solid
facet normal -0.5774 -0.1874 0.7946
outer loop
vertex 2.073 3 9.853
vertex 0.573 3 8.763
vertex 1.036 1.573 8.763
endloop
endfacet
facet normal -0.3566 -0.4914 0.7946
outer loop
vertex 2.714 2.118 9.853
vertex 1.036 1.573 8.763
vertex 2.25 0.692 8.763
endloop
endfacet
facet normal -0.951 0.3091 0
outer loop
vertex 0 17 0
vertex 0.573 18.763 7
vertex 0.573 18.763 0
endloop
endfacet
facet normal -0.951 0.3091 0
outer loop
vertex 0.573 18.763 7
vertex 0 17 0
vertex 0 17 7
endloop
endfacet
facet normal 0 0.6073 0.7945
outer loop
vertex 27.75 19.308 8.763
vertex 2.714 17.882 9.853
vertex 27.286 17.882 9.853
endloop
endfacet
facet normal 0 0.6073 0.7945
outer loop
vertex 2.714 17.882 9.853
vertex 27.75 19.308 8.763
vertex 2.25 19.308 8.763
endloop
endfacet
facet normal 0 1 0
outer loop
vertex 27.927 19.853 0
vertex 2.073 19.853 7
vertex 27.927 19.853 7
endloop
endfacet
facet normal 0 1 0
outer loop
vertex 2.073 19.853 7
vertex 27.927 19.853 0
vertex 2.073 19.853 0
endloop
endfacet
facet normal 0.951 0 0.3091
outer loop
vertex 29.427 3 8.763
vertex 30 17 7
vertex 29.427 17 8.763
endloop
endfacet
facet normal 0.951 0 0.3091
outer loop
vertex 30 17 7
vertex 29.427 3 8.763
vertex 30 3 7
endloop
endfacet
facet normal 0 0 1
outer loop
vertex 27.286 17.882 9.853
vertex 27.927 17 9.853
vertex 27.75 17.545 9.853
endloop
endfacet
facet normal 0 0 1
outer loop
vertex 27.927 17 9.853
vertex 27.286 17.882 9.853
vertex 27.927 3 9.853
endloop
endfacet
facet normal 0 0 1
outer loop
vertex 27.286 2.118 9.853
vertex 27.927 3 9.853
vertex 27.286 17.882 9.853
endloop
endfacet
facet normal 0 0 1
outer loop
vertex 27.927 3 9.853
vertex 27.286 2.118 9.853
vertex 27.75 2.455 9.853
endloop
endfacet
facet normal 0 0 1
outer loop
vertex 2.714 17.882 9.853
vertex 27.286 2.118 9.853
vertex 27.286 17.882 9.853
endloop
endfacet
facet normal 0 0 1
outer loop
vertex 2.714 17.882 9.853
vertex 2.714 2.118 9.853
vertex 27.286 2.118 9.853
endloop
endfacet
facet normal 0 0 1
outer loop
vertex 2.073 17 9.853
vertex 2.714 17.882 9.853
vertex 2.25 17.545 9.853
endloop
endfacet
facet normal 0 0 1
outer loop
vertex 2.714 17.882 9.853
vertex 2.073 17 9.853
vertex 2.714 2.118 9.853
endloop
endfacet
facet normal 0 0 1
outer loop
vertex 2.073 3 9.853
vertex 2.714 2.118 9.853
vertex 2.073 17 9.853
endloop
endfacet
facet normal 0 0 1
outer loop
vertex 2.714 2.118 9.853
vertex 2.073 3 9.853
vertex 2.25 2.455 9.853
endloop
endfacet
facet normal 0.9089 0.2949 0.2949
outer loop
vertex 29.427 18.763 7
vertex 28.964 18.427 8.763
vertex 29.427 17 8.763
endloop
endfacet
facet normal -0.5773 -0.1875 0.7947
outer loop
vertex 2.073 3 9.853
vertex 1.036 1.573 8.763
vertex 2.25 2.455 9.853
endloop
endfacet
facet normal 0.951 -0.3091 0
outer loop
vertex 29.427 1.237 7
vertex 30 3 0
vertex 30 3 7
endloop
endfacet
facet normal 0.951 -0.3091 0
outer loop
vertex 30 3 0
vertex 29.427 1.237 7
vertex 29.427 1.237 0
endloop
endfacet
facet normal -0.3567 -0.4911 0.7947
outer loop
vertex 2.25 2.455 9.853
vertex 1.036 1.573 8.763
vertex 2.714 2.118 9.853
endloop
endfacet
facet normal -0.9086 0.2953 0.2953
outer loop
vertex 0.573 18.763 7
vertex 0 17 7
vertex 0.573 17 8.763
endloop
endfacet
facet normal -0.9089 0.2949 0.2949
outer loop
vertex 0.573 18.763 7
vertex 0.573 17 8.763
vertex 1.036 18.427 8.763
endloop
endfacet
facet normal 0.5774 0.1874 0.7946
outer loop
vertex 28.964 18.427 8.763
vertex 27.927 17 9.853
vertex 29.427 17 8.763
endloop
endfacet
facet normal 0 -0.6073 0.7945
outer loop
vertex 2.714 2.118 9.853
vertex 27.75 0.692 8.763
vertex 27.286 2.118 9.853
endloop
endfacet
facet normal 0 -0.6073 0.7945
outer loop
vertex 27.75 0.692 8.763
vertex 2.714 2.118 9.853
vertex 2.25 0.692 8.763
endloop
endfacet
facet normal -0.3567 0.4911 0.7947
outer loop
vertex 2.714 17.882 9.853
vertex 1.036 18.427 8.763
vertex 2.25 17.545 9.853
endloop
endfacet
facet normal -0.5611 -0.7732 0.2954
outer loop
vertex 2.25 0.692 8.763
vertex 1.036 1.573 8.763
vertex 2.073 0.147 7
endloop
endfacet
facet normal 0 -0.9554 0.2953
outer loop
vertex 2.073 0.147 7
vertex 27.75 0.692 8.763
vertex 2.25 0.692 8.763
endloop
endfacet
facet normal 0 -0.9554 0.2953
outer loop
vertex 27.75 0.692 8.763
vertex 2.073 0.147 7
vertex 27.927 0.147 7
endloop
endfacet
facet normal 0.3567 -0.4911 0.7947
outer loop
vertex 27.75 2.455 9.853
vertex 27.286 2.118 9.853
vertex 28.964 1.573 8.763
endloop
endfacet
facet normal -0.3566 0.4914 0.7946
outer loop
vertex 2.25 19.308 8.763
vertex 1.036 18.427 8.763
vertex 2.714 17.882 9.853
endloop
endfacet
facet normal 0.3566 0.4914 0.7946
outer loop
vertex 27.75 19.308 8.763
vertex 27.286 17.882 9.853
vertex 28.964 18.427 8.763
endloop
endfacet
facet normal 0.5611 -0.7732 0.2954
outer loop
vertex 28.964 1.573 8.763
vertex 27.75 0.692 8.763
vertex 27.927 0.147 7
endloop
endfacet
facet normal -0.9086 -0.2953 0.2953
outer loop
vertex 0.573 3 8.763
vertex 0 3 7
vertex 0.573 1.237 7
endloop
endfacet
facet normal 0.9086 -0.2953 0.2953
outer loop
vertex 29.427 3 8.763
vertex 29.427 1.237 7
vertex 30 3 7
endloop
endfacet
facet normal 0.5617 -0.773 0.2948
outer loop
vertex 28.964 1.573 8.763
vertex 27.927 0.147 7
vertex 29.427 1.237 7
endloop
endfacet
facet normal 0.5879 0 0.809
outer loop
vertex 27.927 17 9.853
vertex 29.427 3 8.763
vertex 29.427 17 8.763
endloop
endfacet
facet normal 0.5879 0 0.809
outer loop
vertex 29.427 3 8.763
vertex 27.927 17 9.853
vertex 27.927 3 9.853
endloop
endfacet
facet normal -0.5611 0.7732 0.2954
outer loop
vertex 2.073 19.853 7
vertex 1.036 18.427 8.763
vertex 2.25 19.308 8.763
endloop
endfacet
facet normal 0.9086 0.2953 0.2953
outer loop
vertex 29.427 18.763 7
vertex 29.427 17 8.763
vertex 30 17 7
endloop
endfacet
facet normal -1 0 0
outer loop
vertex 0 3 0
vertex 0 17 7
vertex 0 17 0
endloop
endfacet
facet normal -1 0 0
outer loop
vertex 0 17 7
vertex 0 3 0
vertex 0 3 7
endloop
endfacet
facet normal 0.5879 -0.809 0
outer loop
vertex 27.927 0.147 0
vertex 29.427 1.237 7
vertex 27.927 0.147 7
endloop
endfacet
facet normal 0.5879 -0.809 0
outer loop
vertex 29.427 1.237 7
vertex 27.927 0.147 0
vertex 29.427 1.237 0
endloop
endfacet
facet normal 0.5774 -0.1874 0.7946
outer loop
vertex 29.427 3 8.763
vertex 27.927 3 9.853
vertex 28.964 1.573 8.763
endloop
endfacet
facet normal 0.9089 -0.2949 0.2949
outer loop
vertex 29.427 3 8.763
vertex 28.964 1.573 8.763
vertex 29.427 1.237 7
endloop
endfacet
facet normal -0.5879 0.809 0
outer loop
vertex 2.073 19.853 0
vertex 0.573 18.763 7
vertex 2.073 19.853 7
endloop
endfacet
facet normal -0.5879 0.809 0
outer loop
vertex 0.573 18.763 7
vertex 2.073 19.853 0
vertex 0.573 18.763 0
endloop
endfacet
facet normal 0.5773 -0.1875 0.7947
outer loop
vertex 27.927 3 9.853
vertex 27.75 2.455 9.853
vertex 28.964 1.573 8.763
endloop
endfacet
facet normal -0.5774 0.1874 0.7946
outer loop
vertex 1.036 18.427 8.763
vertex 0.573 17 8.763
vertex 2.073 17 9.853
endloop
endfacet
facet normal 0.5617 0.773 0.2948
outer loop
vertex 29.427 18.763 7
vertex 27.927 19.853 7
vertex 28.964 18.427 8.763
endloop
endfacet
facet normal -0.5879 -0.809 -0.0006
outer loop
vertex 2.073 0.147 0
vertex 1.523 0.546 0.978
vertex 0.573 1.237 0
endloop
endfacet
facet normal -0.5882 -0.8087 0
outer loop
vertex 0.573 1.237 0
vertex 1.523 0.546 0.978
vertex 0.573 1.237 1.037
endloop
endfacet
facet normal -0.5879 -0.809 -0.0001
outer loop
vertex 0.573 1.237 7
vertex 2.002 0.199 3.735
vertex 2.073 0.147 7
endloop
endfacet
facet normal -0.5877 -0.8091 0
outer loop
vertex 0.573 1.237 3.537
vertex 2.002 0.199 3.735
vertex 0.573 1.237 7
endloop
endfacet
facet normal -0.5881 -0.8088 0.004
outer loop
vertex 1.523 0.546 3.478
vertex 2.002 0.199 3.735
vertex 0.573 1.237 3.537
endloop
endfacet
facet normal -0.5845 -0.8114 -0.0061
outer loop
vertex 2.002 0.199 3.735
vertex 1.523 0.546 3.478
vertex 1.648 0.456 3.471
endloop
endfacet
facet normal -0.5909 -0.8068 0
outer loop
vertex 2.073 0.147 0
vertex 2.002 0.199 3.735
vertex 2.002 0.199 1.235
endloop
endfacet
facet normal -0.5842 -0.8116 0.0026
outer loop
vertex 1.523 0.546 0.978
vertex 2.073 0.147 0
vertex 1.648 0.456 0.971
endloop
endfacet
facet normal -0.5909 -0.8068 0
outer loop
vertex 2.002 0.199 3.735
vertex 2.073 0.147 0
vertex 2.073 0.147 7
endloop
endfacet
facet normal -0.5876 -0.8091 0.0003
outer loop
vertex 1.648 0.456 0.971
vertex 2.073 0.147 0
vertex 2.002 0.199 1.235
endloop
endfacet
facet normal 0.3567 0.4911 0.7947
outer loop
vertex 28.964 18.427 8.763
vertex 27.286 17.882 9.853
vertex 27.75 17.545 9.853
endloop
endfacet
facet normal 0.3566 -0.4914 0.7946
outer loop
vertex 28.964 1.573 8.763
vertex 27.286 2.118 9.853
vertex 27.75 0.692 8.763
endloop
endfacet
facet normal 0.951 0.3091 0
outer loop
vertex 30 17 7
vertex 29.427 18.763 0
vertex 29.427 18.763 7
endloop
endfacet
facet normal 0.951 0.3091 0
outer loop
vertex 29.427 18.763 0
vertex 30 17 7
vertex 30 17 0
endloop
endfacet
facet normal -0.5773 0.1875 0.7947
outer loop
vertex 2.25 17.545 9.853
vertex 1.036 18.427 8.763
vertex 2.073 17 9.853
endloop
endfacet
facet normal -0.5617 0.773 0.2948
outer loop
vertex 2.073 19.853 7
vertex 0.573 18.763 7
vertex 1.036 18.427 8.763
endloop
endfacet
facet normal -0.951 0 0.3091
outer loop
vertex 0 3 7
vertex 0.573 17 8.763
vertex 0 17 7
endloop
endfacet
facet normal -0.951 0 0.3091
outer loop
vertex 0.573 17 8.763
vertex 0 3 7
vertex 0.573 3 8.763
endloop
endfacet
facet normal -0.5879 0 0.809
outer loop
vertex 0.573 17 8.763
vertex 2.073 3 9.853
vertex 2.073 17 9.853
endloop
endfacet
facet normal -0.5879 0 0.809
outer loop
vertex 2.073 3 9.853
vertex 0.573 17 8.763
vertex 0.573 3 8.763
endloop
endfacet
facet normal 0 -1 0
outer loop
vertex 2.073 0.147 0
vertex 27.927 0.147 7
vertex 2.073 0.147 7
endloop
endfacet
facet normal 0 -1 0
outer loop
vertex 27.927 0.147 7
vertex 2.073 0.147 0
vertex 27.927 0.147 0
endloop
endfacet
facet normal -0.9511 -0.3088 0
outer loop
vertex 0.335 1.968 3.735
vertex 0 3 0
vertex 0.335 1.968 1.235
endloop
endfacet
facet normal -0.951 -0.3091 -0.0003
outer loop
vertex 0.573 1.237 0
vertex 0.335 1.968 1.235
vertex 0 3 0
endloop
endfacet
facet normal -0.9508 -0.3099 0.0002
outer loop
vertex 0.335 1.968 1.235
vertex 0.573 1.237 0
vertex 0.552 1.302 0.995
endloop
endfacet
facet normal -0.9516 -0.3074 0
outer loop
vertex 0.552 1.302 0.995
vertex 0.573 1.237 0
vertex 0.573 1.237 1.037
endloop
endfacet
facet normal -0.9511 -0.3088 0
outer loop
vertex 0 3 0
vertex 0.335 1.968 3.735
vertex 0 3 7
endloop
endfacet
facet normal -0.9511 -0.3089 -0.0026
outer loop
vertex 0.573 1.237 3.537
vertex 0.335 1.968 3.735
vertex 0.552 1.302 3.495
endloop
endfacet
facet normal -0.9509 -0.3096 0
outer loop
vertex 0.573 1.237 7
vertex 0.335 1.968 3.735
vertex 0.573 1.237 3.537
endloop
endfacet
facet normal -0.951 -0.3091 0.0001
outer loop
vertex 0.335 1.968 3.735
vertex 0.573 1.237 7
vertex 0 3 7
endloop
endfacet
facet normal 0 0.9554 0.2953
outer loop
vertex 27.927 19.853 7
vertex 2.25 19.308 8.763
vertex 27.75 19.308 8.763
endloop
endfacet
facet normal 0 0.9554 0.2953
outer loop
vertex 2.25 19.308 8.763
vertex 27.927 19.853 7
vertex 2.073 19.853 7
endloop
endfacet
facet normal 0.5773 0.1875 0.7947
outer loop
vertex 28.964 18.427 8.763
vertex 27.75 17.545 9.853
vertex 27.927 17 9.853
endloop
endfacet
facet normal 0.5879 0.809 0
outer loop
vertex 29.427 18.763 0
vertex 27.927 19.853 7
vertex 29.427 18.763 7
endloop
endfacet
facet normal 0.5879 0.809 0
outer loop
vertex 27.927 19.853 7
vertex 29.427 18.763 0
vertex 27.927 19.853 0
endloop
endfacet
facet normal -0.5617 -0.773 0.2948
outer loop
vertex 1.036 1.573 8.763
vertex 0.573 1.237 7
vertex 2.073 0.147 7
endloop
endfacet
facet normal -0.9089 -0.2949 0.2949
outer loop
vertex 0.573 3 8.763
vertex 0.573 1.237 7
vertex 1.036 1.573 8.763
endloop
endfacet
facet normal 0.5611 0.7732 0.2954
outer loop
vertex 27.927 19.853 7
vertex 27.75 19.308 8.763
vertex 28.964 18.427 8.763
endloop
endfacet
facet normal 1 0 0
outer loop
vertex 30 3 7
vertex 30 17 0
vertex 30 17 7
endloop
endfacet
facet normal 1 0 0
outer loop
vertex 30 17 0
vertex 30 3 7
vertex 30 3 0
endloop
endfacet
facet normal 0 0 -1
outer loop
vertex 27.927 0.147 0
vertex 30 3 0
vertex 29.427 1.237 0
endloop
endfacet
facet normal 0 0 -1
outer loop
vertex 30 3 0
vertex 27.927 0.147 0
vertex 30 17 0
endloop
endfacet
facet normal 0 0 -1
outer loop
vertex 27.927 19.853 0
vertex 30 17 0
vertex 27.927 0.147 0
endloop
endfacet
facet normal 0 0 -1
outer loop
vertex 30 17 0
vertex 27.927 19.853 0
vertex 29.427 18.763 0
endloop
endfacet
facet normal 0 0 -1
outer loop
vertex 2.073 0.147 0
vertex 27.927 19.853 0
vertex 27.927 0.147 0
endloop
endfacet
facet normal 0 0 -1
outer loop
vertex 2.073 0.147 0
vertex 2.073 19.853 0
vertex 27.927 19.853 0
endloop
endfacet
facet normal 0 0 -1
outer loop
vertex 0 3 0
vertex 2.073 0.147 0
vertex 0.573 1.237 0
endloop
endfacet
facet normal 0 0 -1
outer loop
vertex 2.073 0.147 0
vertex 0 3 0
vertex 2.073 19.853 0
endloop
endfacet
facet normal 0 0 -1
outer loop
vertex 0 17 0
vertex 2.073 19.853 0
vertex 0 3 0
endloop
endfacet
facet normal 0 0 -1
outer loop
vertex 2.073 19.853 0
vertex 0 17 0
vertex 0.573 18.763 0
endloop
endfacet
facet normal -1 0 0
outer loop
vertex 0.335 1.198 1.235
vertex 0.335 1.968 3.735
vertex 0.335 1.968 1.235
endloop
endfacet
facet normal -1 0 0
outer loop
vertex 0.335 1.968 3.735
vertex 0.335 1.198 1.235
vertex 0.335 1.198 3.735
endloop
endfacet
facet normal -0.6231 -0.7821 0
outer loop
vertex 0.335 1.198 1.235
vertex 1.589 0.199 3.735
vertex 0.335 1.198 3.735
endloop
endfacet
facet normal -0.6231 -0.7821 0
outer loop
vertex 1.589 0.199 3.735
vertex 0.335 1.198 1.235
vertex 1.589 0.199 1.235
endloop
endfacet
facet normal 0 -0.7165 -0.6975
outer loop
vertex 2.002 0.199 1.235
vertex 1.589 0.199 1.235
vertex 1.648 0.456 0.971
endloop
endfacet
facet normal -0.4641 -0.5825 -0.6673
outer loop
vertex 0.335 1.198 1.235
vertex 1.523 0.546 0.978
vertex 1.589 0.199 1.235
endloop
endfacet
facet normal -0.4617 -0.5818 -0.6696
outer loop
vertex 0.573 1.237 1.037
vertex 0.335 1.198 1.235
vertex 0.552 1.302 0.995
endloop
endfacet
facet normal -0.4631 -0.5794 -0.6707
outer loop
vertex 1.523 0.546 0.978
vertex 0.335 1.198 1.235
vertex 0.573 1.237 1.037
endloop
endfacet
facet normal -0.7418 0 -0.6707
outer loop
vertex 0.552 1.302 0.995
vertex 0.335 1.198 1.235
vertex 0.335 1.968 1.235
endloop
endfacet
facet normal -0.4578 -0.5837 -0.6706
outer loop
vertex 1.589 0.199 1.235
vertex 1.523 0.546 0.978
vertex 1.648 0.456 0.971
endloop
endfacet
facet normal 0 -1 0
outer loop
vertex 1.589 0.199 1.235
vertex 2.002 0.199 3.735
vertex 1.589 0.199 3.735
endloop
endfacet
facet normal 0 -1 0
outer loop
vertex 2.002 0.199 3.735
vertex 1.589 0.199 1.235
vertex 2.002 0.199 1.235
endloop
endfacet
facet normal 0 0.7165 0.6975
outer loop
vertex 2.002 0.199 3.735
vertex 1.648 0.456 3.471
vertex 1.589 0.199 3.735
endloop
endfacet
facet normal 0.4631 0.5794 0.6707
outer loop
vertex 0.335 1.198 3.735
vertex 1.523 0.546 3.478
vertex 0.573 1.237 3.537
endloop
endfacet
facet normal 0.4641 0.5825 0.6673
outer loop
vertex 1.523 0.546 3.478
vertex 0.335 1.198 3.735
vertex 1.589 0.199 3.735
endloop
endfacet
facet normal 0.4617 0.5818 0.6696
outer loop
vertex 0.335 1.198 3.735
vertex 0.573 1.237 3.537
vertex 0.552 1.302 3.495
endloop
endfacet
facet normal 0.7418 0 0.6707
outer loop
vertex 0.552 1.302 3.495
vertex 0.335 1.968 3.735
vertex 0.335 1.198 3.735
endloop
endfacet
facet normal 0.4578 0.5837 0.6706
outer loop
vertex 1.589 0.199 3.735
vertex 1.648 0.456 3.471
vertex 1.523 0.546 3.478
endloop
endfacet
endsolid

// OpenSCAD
// Holder for 26650/32700 batteries
// Author mr.yezhang@gmail.com

include <BOSL/constants.scad>
use <BOSL/transforms.scad>
include <../OpenSCAD-common-libraries/roundedCube.scad>

wall_thickness=5;

// Battery is cylinder shape. 
battery_length = 66;
battery_diameter = 26;

// Output wires
wire_thickness = 4;
wire_hole_diameter = wire_thickness+0.12;

contact_width = 10; //
anode_height = 1.5;

// Cathod has spring. This is uncompressed value. 
cathode_height = 8;

// This is the sizes inside the walls.
compartment_x_length=battery_length+anode_height+(cathode_height/2); // make cathod spring compressed
compartment_y_length=battery_diameter+1.5;
compartment_z_length=compartment_y_length; 

screw_tab_x_length=12; // at each end. 
rounded_corner_radius=2;

// Motor shaft cut metrics.
cut_height=5.82;
cut_diameter=3; 
cut_depth=1;
cube_offset=(cut_diameter+cut_depth)/2;

// To easily insert/remove battery.
module side_cut() {
    diameter=compartment_x_length*0.7;
    up(wall_thickness/2+compartment_y_length/2)
    xrot(90)
        cylinder(h = wall_thickness, d=diameter, center = true, $fn=90);
}

module wire_hole() {
    diameter=compartment_x_length*2/3;
    back(compartment_y_length/2)
        cube([wire_hole_diameter, compartment_y_length, wire_hole_diameter], center = true);
}

module battery_holder() {
    difference() {    
        roundedCube([compartment_x_length+(wall_thickness*2), compartment_y_length+(wall_thickness*2), compartment_z_length+wall_thickness], 
            center=true, r=rounded_corner_radius,
            z=false,
            y=false,
            x=false);
        
       up(wall_thickness/2)
            roundedCube([compartment_x_length, compartment_y_length, compartment_z_length], 
                center=true, r=rounded_corner_radius,
                z=false,
                y=false,
                x=false);
      
      y_offset=(compartment_y_length+wall_thickness)/2;
      back(y_offset)  
        side_cut();
        
      fwd(y_offset)  
        side_cut();
      
      x_offset=(compartment_x_length+wire_hole_diameter)/2;
      right(x_offset)
        #wire_hole();
        
      left(x_offset)
        #wire_hole();
    }
}

battery_holder();
